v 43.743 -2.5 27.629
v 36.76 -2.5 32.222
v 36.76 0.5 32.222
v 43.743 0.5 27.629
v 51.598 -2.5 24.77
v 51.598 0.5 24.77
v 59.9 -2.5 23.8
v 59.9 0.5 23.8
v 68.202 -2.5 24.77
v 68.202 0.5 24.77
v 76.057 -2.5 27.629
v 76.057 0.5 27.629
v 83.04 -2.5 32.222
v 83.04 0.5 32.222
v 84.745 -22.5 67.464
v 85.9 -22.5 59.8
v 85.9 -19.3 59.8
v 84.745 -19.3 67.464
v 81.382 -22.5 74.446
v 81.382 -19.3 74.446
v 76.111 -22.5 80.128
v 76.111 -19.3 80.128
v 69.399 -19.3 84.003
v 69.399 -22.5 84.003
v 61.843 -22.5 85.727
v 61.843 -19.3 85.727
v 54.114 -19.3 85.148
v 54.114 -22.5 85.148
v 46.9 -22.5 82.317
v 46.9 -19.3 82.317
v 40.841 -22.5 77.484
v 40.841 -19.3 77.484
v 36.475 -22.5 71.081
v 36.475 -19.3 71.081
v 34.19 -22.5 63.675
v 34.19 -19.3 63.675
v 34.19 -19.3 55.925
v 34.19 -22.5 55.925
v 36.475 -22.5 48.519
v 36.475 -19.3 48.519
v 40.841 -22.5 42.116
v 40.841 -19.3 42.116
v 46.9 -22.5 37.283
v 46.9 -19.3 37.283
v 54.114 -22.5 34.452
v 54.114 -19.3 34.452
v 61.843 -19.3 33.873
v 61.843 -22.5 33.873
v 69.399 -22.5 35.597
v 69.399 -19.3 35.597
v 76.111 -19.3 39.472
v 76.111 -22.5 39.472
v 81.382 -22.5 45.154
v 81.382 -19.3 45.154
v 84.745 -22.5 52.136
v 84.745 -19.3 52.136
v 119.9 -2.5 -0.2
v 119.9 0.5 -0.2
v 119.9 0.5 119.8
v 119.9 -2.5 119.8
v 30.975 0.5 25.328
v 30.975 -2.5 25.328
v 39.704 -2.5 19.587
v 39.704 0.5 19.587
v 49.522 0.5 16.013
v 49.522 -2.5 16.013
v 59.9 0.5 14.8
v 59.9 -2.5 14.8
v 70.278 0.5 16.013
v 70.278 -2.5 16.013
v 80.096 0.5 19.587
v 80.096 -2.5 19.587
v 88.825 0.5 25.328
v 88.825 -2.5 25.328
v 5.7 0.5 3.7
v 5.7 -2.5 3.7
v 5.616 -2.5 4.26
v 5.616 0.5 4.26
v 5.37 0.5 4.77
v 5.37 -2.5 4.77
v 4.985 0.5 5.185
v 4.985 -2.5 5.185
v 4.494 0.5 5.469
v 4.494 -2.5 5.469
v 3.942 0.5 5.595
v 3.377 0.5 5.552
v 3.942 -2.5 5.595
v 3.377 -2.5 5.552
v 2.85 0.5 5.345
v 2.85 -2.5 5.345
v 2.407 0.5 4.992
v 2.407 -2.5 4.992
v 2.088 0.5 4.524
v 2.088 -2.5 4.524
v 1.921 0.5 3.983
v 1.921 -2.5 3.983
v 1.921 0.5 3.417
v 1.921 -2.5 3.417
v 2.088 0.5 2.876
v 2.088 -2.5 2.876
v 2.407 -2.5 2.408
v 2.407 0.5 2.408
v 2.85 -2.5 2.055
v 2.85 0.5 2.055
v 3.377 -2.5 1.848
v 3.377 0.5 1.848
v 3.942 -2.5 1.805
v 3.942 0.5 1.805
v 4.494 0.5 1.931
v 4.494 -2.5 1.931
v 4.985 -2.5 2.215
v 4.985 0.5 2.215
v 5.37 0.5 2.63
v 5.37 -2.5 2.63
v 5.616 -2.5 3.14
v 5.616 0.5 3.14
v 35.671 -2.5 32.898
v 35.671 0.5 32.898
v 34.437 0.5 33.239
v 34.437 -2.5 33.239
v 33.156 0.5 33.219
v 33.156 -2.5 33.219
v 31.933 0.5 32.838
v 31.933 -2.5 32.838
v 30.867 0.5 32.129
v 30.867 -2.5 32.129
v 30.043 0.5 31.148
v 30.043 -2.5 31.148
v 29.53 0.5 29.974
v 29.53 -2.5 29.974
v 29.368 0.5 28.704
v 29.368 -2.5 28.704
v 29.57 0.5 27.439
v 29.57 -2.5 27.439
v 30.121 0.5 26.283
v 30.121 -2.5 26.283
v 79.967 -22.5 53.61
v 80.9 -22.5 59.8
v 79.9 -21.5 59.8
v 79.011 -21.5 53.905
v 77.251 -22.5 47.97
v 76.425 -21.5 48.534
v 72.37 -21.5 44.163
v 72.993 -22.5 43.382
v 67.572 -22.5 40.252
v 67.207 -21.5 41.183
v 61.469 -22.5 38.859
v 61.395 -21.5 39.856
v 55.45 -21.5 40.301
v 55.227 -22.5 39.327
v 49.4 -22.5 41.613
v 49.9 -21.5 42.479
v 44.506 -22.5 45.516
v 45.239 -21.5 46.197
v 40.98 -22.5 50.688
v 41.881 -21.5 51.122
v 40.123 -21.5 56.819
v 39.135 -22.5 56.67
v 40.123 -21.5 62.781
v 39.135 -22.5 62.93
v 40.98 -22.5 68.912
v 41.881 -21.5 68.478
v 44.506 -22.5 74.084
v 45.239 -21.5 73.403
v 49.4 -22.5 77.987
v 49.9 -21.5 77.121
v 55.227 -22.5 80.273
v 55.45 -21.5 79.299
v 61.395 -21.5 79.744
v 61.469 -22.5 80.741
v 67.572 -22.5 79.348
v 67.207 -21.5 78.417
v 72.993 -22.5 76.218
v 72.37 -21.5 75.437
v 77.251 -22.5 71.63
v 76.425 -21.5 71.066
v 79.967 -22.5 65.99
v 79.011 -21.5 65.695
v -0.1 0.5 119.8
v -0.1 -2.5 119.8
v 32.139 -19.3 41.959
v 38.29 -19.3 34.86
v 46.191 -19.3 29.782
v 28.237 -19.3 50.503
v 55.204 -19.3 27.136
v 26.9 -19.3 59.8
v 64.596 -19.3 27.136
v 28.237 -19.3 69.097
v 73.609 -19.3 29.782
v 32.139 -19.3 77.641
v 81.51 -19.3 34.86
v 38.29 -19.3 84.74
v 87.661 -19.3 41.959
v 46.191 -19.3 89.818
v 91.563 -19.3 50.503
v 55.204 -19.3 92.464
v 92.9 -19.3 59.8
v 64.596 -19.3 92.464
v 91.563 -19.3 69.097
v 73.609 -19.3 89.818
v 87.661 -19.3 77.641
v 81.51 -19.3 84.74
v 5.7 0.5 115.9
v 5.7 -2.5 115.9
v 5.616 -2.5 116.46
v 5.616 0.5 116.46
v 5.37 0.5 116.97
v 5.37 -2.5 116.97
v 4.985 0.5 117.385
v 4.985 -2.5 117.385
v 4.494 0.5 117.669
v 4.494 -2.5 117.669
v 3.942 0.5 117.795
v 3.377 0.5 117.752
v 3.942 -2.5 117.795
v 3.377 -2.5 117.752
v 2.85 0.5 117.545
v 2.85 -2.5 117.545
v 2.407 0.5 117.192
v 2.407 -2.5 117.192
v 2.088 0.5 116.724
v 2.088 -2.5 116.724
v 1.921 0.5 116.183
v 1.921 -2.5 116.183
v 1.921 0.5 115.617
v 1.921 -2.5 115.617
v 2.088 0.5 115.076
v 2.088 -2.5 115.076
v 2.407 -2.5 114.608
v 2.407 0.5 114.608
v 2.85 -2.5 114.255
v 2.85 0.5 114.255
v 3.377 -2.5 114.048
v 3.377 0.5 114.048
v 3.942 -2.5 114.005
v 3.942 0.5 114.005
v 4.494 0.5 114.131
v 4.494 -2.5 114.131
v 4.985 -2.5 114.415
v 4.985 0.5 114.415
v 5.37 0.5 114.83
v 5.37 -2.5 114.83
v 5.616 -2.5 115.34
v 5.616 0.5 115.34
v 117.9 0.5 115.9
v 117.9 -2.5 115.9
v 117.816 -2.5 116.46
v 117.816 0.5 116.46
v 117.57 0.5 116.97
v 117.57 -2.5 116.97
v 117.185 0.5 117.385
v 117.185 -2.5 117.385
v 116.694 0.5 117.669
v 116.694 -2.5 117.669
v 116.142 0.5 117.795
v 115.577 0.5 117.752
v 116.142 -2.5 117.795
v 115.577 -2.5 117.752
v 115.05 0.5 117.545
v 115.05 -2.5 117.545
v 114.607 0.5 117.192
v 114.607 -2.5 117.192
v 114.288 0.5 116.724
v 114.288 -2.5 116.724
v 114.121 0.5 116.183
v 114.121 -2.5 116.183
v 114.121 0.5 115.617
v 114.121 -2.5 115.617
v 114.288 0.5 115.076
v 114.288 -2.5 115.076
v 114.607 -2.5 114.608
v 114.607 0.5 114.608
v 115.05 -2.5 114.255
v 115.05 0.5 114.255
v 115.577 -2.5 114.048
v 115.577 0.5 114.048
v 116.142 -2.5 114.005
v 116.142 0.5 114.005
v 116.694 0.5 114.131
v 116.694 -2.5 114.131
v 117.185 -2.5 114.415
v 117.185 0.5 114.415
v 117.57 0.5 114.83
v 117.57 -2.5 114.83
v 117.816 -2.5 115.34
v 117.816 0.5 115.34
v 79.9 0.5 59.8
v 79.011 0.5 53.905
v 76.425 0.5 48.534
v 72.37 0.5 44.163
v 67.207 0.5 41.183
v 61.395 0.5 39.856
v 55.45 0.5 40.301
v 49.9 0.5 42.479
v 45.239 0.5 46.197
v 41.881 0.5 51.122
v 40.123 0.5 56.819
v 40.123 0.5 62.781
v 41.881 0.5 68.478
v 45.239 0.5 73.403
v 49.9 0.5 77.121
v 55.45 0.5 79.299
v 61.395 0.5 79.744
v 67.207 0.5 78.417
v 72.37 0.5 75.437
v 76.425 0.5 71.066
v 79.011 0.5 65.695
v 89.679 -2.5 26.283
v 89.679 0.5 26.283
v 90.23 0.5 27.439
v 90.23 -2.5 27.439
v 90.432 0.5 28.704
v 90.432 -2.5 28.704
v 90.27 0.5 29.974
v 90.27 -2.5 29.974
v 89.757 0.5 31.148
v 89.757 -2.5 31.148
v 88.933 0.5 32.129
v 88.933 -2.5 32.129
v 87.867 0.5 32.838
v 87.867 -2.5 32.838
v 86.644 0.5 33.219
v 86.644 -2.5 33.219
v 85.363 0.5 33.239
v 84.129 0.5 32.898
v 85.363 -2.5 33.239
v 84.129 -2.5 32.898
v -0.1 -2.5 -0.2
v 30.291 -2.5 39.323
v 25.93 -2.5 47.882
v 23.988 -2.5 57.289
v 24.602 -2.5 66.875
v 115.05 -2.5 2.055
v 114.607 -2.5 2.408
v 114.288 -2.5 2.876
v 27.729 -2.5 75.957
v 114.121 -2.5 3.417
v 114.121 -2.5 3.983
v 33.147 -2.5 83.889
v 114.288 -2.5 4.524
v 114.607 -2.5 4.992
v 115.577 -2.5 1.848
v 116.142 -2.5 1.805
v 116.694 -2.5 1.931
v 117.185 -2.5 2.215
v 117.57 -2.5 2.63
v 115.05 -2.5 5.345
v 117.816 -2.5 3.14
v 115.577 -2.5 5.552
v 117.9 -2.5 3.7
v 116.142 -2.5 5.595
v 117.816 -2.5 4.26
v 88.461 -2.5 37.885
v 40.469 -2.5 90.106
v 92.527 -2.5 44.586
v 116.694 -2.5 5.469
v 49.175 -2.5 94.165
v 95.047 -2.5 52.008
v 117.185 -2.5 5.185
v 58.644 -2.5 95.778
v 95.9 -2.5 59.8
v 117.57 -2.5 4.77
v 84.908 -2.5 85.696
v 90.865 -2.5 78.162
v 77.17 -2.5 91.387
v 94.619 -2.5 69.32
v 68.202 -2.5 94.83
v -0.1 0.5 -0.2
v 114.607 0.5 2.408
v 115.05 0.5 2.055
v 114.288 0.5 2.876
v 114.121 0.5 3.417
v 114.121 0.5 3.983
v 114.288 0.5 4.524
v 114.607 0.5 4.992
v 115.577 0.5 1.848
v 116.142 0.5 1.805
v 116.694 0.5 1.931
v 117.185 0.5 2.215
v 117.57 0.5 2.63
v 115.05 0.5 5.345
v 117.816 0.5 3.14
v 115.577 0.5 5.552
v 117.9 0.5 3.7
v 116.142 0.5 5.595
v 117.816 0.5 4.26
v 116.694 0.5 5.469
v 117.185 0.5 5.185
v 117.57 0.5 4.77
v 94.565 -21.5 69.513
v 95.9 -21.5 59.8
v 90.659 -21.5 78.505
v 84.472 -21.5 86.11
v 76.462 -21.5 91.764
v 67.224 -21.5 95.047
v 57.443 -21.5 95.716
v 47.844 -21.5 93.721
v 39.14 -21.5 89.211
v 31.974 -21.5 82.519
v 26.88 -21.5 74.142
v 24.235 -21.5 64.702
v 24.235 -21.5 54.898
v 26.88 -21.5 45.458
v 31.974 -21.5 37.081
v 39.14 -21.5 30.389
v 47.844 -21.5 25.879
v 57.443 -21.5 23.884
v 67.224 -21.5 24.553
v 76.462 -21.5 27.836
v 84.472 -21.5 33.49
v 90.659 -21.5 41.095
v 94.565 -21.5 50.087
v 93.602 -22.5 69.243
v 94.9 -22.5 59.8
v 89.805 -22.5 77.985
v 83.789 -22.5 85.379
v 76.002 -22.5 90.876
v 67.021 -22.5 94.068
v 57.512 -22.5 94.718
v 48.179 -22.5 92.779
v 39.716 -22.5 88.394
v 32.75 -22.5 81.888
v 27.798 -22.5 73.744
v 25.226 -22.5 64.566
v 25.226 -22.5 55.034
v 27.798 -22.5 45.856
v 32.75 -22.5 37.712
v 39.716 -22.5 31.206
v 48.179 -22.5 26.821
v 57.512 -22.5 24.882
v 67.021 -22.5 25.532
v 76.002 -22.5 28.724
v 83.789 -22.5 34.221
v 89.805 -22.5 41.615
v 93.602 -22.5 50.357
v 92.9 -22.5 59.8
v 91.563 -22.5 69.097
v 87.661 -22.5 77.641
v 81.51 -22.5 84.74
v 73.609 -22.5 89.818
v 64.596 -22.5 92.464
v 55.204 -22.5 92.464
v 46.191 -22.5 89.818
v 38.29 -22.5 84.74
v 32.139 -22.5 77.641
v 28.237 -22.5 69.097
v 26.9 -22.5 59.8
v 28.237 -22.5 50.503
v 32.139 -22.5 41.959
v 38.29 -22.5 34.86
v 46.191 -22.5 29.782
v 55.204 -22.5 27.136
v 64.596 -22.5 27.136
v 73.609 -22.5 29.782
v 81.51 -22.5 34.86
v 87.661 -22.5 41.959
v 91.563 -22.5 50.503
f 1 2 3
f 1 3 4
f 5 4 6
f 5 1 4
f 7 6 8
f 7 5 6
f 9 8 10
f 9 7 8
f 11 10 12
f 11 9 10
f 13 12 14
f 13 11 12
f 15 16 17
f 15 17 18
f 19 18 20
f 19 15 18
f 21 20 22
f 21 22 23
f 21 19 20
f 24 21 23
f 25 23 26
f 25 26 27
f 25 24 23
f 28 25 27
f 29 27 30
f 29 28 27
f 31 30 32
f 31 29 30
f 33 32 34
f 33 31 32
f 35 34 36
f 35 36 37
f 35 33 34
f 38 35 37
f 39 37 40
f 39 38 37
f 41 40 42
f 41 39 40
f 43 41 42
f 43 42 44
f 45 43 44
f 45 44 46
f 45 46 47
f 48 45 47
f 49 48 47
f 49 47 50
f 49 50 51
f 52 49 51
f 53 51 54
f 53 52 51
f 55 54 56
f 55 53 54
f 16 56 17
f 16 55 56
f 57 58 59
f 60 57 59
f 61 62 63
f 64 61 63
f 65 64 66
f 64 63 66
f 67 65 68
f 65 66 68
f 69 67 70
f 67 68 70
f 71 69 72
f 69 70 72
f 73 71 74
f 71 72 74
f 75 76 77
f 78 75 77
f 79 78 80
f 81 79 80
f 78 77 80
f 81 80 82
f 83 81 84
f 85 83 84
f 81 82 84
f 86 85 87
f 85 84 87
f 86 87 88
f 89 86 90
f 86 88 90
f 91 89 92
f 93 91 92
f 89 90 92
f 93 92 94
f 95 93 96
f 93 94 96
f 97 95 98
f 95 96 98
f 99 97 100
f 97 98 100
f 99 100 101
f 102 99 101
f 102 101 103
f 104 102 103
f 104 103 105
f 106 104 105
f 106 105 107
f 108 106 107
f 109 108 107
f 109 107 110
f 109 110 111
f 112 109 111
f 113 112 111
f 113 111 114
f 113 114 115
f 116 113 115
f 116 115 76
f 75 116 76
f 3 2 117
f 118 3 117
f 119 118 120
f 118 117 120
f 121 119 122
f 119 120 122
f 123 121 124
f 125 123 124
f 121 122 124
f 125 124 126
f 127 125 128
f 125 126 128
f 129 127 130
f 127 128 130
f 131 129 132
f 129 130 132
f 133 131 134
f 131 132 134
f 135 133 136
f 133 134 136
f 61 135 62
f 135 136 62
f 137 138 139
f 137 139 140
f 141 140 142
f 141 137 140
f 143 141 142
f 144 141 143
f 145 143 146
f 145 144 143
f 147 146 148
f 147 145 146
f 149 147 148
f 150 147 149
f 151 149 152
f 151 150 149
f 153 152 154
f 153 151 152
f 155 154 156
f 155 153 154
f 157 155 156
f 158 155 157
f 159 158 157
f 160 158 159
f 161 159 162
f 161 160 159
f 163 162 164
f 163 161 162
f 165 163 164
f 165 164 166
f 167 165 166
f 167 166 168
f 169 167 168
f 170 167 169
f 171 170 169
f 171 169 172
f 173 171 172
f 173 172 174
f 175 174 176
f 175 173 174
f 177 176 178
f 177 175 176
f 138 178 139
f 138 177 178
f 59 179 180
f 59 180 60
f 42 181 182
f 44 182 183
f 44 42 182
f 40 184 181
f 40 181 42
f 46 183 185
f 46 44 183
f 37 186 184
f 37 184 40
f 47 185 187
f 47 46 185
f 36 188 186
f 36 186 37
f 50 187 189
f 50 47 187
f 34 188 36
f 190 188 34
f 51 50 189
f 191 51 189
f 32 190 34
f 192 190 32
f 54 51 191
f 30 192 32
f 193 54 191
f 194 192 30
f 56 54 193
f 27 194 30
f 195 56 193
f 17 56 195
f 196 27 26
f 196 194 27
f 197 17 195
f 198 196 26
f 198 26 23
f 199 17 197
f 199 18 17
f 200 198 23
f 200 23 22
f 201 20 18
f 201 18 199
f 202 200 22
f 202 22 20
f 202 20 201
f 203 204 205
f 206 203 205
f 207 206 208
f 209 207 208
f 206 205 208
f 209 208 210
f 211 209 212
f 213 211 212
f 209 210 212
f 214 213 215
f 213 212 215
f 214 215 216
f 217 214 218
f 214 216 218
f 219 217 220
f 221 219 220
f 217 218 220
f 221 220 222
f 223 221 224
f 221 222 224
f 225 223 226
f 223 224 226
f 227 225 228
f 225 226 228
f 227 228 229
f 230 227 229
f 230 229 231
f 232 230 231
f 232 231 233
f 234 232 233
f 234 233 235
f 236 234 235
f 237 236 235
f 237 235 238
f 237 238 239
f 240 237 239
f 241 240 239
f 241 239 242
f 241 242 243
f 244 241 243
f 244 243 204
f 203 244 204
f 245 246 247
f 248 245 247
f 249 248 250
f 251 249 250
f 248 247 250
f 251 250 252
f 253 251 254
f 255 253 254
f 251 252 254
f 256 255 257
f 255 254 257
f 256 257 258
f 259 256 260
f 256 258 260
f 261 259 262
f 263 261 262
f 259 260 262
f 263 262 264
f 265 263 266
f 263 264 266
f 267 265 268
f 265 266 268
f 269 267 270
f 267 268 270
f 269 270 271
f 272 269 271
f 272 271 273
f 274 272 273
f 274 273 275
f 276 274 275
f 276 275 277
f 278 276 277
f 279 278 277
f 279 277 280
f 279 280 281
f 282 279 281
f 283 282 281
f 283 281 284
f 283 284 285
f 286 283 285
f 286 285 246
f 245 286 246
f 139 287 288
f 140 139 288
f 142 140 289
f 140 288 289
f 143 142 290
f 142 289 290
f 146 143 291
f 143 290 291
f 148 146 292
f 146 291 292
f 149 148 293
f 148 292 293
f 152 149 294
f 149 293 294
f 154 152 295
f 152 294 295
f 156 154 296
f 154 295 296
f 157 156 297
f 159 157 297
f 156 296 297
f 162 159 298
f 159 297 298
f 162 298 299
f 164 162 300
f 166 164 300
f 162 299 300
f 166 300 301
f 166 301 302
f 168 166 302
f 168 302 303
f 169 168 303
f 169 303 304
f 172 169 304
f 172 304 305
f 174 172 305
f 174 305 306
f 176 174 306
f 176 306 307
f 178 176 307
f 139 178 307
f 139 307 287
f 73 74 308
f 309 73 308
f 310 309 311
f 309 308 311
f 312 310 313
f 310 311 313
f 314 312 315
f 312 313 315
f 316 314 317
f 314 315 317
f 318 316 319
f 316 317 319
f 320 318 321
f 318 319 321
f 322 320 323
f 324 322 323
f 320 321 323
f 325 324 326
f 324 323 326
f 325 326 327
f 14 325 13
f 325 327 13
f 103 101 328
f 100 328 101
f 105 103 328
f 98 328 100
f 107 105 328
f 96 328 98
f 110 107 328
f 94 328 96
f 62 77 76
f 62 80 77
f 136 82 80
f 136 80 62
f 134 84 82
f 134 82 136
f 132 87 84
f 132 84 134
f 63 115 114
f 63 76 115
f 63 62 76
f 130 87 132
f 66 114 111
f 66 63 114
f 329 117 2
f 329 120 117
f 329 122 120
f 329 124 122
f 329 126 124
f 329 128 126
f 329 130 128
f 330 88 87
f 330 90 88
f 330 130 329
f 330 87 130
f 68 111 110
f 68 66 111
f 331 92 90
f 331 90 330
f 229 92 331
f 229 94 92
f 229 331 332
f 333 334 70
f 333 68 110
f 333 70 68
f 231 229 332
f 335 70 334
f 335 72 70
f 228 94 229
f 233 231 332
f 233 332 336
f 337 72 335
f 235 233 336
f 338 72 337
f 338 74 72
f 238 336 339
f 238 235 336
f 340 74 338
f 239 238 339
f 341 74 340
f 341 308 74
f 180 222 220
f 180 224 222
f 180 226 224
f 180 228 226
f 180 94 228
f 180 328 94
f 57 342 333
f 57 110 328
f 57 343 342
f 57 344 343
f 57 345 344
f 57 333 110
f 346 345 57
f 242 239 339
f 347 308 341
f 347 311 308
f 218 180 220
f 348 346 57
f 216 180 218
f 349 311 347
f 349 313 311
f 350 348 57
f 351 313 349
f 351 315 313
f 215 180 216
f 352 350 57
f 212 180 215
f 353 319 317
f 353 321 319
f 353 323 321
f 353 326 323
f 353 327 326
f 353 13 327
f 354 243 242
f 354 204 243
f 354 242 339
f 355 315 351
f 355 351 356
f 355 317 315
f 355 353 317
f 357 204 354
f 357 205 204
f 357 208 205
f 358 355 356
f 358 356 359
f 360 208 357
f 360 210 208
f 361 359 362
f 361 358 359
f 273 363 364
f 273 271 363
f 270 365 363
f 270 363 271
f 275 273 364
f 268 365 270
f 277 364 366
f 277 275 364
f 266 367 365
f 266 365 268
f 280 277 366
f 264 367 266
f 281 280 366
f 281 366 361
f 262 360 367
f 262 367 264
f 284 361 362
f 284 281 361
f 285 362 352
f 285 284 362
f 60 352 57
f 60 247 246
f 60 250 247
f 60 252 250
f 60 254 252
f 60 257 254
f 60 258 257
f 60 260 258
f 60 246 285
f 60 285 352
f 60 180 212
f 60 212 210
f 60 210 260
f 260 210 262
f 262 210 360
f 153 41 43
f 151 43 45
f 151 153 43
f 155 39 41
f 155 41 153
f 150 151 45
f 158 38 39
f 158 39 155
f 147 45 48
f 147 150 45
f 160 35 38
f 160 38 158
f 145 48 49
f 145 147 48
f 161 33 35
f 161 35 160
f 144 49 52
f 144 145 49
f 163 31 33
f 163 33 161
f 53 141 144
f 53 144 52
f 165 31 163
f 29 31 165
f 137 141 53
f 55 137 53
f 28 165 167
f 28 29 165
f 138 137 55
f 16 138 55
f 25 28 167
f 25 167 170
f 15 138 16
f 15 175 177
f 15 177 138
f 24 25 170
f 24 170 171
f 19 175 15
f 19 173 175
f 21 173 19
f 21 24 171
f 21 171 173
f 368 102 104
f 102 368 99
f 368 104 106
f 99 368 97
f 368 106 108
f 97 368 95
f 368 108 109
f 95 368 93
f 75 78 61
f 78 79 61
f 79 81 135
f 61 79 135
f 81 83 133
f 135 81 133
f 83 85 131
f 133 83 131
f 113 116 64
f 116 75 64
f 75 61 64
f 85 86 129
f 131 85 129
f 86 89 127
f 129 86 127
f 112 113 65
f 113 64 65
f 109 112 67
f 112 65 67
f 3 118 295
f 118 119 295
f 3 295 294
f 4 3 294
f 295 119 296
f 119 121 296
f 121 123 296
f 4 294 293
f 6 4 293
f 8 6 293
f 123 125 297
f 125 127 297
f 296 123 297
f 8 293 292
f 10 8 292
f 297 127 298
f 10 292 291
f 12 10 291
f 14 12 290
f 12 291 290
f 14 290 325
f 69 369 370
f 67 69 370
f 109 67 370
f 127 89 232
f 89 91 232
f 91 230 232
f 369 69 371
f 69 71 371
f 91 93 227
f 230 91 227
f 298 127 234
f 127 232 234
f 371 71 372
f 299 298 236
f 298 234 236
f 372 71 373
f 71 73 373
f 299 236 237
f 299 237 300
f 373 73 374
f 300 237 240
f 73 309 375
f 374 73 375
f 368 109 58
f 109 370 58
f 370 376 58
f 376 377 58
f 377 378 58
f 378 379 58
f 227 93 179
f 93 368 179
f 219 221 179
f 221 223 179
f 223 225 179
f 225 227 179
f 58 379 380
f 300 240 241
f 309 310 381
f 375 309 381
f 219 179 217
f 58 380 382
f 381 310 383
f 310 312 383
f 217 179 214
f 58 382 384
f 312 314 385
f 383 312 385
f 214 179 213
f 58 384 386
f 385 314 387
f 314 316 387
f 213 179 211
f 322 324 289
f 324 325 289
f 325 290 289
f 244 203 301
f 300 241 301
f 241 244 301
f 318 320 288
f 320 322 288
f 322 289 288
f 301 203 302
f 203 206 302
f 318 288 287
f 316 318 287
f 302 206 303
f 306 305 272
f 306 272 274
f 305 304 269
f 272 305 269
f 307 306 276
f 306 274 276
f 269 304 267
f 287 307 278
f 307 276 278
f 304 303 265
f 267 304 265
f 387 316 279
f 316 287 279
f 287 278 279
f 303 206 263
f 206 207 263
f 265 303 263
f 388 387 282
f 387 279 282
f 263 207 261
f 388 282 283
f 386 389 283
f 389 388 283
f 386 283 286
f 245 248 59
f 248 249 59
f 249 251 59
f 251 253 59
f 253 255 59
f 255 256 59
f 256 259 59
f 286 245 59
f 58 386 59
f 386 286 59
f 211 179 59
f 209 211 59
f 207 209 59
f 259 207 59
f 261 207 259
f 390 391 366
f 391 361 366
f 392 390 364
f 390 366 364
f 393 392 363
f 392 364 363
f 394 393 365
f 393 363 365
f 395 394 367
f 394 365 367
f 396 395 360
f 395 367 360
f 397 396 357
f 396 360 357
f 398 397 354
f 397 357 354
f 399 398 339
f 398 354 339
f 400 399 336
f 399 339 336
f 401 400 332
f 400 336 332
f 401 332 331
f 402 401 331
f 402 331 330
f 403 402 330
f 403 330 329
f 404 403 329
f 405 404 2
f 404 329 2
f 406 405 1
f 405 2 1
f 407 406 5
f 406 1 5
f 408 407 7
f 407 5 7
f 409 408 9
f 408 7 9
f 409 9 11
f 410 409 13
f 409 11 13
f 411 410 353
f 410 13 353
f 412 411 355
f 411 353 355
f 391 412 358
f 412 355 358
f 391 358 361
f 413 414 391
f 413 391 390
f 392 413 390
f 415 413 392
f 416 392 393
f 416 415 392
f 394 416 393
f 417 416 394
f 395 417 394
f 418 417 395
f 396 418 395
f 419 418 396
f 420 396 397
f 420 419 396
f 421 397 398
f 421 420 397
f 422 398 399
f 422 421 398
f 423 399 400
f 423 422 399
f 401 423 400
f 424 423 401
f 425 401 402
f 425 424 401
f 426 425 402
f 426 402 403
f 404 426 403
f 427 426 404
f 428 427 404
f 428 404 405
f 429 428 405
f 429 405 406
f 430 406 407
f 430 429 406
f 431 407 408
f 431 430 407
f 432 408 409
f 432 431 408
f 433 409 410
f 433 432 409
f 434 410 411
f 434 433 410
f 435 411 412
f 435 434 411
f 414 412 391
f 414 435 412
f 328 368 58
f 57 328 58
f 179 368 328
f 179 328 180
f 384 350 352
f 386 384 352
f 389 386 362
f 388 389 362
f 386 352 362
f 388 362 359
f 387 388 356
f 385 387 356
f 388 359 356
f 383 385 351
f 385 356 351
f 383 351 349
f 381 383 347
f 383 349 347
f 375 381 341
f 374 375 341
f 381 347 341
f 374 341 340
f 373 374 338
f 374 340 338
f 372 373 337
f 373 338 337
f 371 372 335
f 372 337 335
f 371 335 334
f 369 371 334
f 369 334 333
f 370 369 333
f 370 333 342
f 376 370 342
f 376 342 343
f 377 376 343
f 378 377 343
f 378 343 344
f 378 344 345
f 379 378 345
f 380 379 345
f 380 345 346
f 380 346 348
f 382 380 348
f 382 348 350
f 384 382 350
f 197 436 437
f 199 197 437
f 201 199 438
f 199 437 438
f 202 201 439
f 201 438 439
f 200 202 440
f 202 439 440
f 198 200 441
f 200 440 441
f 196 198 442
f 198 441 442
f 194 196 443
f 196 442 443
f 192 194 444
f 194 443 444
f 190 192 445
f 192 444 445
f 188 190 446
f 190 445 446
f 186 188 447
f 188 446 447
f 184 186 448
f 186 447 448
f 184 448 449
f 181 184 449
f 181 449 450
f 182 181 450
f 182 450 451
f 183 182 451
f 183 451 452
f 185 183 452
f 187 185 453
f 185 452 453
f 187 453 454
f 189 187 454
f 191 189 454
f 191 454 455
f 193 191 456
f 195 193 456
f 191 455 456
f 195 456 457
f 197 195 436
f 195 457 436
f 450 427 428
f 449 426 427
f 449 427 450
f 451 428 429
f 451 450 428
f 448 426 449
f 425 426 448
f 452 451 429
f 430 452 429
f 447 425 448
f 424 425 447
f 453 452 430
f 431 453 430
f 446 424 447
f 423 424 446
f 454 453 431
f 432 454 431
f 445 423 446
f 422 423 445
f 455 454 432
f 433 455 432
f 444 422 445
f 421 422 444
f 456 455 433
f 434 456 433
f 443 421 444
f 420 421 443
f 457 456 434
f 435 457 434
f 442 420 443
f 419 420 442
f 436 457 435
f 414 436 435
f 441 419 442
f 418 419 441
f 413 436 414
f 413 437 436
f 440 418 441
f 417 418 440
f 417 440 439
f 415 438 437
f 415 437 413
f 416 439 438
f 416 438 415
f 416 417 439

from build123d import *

# Parameters (mm, degrees)
SKETCH054_W     = 120
SKETCH054_H     = 120
PAD015_DEPTH    = 3
SKETCH065_R     = 1.9
POCKET034_DEPTH = 3.001
SKETCH064_R     = 20
POCKET036_DEPTH = 3.001
SKETCH058_R     = 36
PAD013_DEPTH    = 20
SKETCH055_R     = 20
POCKET035_DEPTH = 20.001
SKETCH056_R     = 33
SKETCH056_R_2   = 26
POCKET037_DEPTH = 3.2
CHAMFER003_SIZE = 1
CHAMFER002_SIZE = 1
POCKET042_DEPTH = 3.001


with BuildPart() as part:
    # Sketch054 → Pad015 (new body)
    with BuildSketch(Plane.XZ):
        with Locations((60, 60)):
            Rectangle(SKETCH054_W, SKETCH054_H)
    extrude(amount=PAD015_DEPTH)

    # Sketch065 (on Face6 of Pad015) → Pocket034 (cut, through all)
    with BuildSketch(Plane.XZ.offset(3)):
        with Locations((3.9, 3.9)):
            Circle(SKETCH065_R)
        with Locations((116.1, 3.9)):
            Circle(SKETCH065_R)
        with Locations((116.1, 116.1)):
            Circle(SKETCH065_R)
        with Locations((3.9, 116.1)):
            Circle(SKETCH065_R)
    extrude(amount=-POCKET034_DEPTH, mode=Mode.SUBTRACT)

    # Sketch064 (on Face5 of Pocket034) → Pocket036 (cut, through all)
    with BuildSketch(Plane.XZ.offset(3)):
        with Locations((60, 60)):
            Circle(SKETCH064_R)
    extrude(amount=-POCKET036_DEPTH, mode=Mode.SUBTRACT)

    # Sketch058 (on Face5 of Pocket036) → Pad013 (join)
    with BuildSketch(Plane.XZ.offset(3)):
        with Locations((60, 60)):
            Circle(SKETCH058_R)
    extrude(amount=PAD013_DEPTH)

    # Sketch055 (on Face13 of Pad013) → Pocket035 (cut, through all)
    with BuildSketch(Plane(origin=(0, -3, 0), x_dir=(1, 0, 0), z_dir=(0, 1, 0))):
        with Locations((60, -60)):
            Circle(SKETCH055_R)
    extrude(amount=-POCKET035_DEPTH, mode=Mode.SUBTRACT)

    # Sketch056 (on Face14 of Pocket035) → Pocket037 (cut)
    with BuildSketch(Plane.XZ.offset(23)):
        with Locations((60, 60)):
            Circle(SKETCH056_R)
        with Locations((60, 60)):
            Circle(SKETCH056_R_2, mode=Mode.SUBTRACT)
    extrude(amount=-POCKET037_DEPTH, mode=Mode.SUBTRACT)

    # Chamfer003
    chamfer003_edges = [part.edges().sort_by_distance(p)[0] for p in [
        (40, -23, 60),
    ]]
    chamfer(chamfer003_edges, length=CHAMFER003_SIZE)

    # Chamfer002
    chamfer002_edges = [part.edges().sort_by_distance(p)[0] for p in [
        (24, -23, 60),
    ]]
    chamfer(chamfer002_edges, length=CHAMFER002_SIZE)

    # Sketch066 (on Face3 of Chamfer002) → Pocket042 (cut, through all)
    with BuildSketch(Plane.XZ.offset(3)):
        with BuildLine():
            ThreePointArc((36.859646, 32.4224), (60, 24), (83.140354, 32.4224))
            ThreePointArc((88.925456, 25.528011), (89.480105, 31.867761), (83.140354, 32.4224))
            ThreePointArc((31.074571, 25.527989), (60.000017, 15), (88.925456, 25.528011))
            ThreePointArc((36.859646, 32.4224), (30.519908, 31.867728), (31.074571, 25.527989))
        make_face()
    extrude(amount=-POCKET042_DEPTH, mode=Mode.SUBTRACT)


with BuildPart() as part_1:
    # Body007 placement: moved
    add(part.part.moved(Location((-0.1, 0.5, -0.2))))


solid = part_1.part
